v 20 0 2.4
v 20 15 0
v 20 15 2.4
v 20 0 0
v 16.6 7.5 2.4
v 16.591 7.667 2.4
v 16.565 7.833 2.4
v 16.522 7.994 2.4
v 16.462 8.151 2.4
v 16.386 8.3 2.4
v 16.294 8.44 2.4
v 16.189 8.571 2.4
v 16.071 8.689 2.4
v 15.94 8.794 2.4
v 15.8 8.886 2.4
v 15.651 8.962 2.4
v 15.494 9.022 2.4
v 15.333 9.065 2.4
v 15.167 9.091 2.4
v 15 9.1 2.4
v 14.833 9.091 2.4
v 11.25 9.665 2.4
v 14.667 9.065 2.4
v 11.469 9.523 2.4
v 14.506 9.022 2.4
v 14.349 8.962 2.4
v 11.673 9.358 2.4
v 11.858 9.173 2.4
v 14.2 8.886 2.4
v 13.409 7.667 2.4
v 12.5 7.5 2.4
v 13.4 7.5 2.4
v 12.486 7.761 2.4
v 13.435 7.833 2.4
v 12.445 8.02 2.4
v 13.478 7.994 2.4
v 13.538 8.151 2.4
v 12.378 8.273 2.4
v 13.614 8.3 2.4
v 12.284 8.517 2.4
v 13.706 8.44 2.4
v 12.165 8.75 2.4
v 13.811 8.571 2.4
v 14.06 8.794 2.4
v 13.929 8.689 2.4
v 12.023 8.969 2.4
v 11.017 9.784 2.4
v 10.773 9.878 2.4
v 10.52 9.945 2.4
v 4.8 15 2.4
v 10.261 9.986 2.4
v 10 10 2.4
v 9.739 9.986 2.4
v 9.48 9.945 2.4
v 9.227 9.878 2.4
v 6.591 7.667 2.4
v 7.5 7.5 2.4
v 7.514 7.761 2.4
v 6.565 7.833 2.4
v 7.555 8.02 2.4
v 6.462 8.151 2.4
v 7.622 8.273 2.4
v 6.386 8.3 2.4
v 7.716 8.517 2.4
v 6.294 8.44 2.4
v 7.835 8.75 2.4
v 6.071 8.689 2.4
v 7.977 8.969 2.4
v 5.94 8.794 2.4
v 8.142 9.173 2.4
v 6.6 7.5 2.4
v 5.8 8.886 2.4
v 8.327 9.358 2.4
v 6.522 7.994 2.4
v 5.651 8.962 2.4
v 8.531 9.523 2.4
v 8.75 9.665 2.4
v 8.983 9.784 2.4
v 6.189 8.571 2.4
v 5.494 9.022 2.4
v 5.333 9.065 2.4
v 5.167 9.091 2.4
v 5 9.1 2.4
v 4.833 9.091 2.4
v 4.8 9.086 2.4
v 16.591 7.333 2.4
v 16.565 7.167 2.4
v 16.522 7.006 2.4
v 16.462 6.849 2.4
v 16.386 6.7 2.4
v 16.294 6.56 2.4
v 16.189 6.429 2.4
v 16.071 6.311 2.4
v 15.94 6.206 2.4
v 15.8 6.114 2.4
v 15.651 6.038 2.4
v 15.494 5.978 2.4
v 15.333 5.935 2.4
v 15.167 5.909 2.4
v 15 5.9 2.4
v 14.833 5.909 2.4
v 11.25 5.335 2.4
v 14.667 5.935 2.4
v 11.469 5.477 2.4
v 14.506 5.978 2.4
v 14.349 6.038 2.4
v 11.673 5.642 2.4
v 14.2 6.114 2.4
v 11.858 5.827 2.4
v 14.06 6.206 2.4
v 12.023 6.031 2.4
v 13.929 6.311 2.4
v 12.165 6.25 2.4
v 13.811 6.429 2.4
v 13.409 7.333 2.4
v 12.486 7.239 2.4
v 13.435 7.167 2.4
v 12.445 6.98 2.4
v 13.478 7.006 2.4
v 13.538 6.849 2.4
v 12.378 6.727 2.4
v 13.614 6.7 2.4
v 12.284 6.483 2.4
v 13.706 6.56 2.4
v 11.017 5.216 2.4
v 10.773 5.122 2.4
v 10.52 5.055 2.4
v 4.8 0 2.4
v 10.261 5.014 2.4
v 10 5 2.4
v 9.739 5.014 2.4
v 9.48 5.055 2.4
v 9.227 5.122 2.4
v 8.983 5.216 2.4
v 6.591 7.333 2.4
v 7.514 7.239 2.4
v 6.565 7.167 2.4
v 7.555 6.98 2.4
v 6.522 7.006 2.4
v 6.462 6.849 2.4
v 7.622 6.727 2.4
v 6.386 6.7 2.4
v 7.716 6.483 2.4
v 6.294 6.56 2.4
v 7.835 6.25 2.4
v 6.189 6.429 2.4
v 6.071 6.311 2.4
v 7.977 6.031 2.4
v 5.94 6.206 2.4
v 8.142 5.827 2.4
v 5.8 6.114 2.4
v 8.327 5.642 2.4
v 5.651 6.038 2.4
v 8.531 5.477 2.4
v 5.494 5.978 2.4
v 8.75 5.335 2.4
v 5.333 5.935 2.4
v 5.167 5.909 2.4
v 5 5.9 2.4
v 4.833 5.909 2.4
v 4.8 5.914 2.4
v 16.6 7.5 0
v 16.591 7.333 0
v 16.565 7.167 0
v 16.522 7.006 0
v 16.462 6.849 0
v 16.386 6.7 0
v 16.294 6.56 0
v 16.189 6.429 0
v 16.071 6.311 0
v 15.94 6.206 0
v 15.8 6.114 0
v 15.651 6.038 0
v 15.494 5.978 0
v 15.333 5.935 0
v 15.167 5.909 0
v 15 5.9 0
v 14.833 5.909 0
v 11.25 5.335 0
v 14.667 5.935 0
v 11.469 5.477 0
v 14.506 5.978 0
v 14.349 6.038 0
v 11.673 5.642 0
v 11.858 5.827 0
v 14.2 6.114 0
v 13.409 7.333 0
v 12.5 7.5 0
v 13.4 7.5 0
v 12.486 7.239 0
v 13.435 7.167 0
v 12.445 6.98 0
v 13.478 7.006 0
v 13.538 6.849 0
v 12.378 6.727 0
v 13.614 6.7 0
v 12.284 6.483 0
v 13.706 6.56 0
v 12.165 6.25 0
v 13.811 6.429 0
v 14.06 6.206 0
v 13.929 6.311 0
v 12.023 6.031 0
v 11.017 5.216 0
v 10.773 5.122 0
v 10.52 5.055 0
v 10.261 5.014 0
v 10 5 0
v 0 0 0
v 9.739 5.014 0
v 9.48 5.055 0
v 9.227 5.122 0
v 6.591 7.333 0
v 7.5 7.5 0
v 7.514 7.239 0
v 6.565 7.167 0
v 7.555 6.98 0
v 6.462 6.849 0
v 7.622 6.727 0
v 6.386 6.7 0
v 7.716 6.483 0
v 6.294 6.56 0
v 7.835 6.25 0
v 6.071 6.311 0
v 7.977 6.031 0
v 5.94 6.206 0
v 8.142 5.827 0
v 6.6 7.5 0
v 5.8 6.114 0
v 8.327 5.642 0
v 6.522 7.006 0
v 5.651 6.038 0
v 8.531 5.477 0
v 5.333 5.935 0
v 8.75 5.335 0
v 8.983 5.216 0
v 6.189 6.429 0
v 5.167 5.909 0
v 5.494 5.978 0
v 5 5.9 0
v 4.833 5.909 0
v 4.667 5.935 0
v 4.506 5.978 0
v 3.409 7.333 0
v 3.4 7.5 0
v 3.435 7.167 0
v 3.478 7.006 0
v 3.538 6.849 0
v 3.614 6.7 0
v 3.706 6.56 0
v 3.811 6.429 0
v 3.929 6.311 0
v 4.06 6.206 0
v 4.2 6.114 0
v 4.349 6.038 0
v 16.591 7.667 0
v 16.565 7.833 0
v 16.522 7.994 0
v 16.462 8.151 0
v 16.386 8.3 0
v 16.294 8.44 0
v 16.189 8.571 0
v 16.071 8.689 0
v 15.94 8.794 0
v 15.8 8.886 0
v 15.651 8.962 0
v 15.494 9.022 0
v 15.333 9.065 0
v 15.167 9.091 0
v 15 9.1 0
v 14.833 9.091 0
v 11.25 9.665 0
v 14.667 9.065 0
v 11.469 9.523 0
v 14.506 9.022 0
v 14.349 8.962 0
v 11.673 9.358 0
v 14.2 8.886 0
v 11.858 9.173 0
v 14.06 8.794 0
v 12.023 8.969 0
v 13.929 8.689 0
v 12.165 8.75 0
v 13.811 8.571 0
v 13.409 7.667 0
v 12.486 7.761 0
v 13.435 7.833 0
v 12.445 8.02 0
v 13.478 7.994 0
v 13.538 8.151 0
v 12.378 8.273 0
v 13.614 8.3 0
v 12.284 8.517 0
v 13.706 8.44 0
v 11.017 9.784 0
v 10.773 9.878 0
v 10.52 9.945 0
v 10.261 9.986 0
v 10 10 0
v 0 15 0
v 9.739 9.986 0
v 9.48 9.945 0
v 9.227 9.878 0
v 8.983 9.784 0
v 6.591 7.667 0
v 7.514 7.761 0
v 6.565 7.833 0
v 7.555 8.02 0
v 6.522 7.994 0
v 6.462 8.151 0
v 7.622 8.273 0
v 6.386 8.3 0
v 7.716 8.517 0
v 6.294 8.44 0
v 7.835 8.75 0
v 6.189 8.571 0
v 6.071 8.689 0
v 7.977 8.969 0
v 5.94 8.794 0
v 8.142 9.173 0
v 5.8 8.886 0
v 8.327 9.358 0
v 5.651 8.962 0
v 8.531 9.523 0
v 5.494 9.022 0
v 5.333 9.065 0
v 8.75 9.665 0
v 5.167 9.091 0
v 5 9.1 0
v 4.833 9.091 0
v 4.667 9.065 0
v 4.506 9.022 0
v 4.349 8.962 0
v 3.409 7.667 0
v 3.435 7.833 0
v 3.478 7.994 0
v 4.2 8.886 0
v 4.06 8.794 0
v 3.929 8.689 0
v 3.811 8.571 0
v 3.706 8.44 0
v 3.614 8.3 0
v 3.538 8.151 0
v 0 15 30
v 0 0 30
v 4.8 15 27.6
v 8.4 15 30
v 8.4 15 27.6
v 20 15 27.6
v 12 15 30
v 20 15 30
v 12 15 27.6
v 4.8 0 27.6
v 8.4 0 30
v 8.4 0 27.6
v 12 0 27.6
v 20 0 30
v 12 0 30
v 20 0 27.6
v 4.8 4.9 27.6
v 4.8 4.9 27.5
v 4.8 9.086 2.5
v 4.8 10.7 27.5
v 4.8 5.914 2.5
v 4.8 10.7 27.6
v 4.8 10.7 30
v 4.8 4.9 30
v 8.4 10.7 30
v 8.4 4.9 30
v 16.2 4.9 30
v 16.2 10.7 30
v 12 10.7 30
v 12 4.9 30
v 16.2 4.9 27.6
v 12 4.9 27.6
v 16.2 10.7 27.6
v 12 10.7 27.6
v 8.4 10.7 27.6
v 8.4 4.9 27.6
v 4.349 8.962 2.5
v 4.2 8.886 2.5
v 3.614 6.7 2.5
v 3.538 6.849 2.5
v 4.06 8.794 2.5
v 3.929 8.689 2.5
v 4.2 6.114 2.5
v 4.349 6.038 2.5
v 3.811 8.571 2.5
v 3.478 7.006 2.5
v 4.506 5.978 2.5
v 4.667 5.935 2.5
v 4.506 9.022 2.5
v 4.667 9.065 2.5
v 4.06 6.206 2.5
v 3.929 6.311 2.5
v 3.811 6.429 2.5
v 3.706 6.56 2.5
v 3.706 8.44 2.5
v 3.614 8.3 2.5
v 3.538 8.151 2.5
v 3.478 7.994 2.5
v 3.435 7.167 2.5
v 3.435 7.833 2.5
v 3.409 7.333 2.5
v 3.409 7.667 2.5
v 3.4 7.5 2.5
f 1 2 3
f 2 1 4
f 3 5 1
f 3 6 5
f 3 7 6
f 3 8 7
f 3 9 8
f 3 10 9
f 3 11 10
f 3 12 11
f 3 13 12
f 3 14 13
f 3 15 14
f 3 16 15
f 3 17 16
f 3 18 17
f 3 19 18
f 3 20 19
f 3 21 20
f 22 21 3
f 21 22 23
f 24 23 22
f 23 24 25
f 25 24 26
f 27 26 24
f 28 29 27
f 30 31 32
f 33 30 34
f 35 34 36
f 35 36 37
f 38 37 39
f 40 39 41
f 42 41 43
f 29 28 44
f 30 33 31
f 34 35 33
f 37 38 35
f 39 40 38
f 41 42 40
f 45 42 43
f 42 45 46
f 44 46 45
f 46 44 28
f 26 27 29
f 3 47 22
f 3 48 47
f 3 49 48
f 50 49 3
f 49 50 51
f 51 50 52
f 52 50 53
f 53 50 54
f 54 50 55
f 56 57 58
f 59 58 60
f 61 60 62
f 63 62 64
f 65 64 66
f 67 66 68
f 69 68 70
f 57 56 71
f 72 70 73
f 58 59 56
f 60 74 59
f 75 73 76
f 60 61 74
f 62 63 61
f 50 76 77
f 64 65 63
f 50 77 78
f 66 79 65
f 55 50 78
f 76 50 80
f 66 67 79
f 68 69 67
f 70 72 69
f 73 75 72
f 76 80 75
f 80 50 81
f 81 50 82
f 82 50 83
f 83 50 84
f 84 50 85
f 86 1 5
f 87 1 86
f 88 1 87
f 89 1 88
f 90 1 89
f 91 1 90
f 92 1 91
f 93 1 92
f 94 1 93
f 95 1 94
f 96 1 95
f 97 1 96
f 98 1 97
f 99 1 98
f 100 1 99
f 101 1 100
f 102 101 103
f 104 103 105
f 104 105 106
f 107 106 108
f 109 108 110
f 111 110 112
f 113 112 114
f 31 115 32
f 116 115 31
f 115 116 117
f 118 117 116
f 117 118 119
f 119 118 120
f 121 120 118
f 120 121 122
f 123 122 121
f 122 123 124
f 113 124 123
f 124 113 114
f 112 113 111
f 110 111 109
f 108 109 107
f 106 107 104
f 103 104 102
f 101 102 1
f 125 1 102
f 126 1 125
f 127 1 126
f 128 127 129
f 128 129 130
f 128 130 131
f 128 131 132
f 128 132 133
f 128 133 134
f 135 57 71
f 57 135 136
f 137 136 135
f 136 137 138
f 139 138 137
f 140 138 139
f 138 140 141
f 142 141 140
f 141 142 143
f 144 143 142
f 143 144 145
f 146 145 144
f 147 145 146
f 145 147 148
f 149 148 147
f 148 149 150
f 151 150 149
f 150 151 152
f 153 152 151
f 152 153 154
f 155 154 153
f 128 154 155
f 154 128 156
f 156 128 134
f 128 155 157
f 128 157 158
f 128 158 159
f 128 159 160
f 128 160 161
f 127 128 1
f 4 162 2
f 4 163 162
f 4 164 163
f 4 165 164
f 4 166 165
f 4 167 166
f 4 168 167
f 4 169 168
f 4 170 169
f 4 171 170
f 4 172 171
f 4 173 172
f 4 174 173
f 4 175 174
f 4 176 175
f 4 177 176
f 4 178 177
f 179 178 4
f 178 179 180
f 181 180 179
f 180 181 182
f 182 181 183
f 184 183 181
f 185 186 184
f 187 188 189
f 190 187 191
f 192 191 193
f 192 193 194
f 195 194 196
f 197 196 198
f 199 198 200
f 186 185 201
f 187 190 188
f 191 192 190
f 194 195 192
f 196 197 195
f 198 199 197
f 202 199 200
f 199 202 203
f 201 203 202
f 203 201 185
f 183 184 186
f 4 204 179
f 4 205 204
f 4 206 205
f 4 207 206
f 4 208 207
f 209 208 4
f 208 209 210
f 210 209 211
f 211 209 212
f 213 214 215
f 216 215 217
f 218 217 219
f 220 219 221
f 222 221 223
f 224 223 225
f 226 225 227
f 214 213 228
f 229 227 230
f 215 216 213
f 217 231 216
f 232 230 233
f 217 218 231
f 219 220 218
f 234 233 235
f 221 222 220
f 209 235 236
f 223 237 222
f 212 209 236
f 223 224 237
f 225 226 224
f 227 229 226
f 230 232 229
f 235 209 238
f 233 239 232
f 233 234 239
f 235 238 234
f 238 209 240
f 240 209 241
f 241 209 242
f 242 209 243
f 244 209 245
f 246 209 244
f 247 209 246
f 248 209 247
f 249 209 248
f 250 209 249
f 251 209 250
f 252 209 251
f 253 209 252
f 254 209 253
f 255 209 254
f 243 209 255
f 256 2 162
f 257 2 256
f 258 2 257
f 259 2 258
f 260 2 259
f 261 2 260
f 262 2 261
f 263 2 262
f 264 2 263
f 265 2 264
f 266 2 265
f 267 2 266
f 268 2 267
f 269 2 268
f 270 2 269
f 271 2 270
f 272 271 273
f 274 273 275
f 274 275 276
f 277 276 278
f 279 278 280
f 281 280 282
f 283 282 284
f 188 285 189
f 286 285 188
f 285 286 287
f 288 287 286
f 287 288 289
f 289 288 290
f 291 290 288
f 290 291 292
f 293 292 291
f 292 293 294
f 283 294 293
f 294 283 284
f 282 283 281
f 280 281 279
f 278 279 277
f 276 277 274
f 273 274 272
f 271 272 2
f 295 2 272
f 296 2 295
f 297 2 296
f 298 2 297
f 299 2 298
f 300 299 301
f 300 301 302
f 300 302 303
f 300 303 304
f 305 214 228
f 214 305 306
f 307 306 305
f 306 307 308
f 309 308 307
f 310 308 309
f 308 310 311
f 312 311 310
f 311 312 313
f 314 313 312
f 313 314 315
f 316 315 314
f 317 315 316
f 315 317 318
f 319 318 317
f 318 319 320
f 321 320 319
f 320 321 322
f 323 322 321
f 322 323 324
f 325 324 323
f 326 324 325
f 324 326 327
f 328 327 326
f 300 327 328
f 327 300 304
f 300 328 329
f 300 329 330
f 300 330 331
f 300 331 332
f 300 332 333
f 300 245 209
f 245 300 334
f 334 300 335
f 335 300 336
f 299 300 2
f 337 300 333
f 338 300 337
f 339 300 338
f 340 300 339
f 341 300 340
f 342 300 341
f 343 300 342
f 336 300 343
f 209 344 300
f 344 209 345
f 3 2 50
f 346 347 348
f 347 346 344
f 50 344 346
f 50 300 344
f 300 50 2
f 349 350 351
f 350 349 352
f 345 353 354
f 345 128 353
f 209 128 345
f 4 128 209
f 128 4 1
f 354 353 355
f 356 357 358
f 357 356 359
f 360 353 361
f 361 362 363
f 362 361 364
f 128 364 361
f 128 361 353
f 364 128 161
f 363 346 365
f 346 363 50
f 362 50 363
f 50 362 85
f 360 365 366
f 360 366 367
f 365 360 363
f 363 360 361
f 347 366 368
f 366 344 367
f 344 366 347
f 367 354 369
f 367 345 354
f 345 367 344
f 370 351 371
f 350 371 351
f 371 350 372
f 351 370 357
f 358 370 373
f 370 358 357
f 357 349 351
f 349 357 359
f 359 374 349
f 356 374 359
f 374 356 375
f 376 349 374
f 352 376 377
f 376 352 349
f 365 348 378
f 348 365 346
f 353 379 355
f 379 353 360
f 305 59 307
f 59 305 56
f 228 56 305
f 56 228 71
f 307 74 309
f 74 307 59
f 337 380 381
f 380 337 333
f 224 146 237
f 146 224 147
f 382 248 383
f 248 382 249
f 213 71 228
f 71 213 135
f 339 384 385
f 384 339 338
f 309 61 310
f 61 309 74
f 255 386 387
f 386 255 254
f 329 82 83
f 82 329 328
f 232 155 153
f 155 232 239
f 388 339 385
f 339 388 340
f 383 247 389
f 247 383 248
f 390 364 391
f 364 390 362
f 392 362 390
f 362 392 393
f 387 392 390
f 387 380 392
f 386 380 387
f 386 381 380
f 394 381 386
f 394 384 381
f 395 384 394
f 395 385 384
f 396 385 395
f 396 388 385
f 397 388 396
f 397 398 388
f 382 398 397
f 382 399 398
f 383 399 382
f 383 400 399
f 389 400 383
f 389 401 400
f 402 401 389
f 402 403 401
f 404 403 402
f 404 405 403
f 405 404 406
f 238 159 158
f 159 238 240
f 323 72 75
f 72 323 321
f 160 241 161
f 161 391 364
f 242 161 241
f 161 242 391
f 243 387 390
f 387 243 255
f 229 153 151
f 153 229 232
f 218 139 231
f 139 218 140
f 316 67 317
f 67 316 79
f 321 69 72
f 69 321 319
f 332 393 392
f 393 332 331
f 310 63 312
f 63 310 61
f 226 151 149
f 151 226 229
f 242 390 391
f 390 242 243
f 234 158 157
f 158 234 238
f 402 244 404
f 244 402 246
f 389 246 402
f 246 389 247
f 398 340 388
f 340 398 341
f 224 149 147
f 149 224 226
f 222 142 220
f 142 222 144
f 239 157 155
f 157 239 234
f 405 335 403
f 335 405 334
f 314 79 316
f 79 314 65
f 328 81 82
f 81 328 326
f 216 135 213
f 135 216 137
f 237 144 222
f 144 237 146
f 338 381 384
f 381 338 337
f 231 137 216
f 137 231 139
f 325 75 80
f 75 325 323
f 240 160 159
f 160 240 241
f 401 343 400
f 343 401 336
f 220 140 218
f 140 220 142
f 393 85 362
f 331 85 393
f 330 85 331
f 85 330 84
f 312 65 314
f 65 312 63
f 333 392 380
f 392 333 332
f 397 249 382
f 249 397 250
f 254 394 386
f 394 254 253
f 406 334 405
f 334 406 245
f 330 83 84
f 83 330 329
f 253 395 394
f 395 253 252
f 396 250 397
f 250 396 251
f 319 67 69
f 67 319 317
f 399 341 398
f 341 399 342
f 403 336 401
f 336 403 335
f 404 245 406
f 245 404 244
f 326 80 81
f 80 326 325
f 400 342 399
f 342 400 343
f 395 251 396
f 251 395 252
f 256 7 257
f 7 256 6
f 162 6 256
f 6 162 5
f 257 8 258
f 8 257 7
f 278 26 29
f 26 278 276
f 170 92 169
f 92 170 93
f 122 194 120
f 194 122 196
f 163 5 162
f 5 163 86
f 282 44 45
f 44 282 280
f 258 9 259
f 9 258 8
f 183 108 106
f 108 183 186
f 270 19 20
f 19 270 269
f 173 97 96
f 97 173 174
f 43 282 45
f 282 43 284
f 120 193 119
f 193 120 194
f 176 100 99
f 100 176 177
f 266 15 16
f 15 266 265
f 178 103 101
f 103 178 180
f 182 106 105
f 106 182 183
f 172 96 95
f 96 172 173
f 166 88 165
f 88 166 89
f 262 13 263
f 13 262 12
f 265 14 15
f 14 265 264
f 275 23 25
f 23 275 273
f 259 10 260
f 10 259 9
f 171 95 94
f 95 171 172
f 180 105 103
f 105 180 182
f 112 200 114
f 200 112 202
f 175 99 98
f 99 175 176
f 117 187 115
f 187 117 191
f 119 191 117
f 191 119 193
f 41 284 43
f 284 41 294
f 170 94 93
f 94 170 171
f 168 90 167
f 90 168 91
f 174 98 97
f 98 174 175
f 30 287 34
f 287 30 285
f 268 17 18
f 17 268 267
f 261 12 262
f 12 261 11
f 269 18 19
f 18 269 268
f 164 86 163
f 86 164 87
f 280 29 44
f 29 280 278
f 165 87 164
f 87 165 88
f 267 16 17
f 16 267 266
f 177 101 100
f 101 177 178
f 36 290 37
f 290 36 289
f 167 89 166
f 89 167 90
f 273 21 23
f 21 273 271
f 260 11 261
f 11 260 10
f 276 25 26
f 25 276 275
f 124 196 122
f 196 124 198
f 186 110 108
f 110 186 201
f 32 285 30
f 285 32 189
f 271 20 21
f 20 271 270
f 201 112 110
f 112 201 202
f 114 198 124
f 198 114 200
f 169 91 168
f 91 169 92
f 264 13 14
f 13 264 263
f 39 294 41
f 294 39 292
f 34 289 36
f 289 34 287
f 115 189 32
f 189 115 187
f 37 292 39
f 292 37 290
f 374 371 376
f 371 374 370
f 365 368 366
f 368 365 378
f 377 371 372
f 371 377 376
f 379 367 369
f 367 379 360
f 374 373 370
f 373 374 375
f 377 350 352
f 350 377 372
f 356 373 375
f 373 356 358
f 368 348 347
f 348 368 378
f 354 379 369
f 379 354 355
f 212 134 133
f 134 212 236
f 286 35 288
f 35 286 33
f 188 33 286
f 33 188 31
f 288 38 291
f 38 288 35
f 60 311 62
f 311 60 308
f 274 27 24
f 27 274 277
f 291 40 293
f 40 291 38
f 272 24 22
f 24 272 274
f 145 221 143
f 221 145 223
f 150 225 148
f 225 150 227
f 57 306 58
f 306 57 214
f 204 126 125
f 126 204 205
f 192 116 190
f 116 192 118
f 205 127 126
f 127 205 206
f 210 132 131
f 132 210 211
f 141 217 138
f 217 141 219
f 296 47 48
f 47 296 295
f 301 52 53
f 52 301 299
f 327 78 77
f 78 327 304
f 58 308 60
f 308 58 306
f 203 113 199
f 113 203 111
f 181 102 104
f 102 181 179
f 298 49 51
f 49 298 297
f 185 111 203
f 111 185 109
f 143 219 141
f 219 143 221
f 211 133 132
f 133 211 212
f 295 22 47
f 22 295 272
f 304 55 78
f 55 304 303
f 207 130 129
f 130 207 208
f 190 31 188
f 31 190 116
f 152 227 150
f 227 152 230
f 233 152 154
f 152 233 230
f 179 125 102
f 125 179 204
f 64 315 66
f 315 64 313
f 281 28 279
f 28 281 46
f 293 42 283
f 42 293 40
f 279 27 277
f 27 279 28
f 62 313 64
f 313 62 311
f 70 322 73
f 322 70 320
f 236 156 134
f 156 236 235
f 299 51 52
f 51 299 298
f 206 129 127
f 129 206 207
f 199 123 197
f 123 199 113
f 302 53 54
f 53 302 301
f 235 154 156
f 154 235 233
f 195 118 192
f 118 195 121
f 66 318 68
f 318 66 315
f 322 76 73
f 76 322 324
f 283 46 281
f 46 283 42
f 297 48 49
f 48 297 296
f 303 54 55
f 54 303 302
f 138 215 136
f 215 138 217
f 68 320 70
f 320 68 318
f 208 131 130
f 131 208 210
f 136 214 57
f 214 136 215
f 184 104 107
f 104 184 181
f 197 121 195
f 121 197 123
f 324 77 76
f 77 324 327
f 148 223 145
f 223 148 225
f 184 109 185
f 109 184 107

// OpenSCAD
// file: parameters.scad
// =============================================================================
// Coil Winder - Common Parameters
// DTU 34621 Metal Detector Project
// =============================================================================

// -----------------------------------------------------------------------------
// Hardware Dimensions
// -----------------------------------------------------------------------------

// M8 Threaded Rod (Spindle)
spindle_dia = 8;
spindle_length = 300;

// 608ZZ Bearing (Skateboard bearing)
bearing_od = 22;
bearing_id = 8;
bearing_width = 7;

// M3 Hardware
m3_bolt_dia = 3.2;
m3_nut_dia = 6.4;
m3_nut_height = 2.4;
m3_head_dia = 5.5;
m3_head_height = 3;

// M8 Hardware
m8_nut_dia = 14.6;
m8_nut_height = 6.5;

// -----------------------------------------------------------------------------
// Servo Dimensions (SG90 / MG90S style)
// -----------------------------------------------------------------------------

servo_body_w = 23;
servo_body_h = 22.5;
servo_body_d = 12.5;
servo_tab_w = 32.5;
servo_tab_h = 2.5;
servo_tab_offset = 15.5;  // from bottom
servo_mount_hole_spacing = 28;
servo_shaft_offset = 5.5;  // from center of body
servo_horn_length = 15;

// -----------------------------------------------------------------------------
// ITR8307 Optical Sensor
// -----------------------------------------------------------------------------

itr8307_width = 10.8;
itr8307_depth = 5.2;
itr8307_height = 6.3;
itr8307_slot_width = 3;
itr8307_slot_depth = 4;

// -----------------------------------------------------------------------------
// Coil Dimensions
// -----------------------------------------------------------------------------

// TX Coil - 200mm diameter
tx_coil_dia = 200;
tx_coil_width = 18;
tx_coil_turns = 68;

// RX Coil - 80mm diameter
rx_coil_dia = 80;
rx_coil_width = 14;
rx_coil_turns = 170;

// Bucking Coil - 120mm diameter
buck_coil_dia = 120;
buck_coil_width = 18;
buck_coil_turns = 35;

// -----------------------------------------------------------------------------
// Frame Dimensions
// -----------------------------------------------------------------------------

base_length = 250;
base_width = 120;
base_thickness = 5;

bearing_mount_height = 40;
bearing_mount_width = 35;
bearing_mount_depth = 25;

// Distance between bearing centers
spindle_span = 200;

// -----------------------------------------------------------------------------
// Wire Guide / Traverse
// -----------------------------------------------------------------------------

guide_rail_length = 80;
guide_rail_width = 10;
guide_rail_height = 5;

carriage_width = 25;
carriage_depth = 20;
carriage_height = 15;

// -----------------------------------------------------------------------------
// Encoder Wheel
// -----------------------------------------------------------------------------

encoder_wheel_dia = 40;
encoder_wheel_thickness = 5;
encoder_slot_width = 5;
encoder_slot_depth = 12;

// -----------------------------------------------------------------------------
// General Tolerances
// -----------------------------------------------------------------------------

clearance = 0.3;        // General clearance for fitting parts
press_fit = 0.1;        // Tight fit
slide_fit = 0.4;        // Sliding fit

// -----------------------------------------------------------------------------
// Print Settings
// -----------------------------------------------------------------------------

wall_thickness = 2.4;   // 3 perimeters at 0.4mm nozzle
layer_height = 0.2;

$fn = 60;  // Circle resolution
// main file
// =============================================================================
// ITR8307 Sensor Mount - Positions optical sensor for encoder wheel
// =============================================================================

include <parameters.scad>

mount_width = 20;
mount_depth = 15;
mount_height = 30;  // Height to align with encoder wheel

module sensor_mount() {
    difference() {
        union() {
            // Base
            cube([mount_width, mount_depth, wall_thickness]);

            // Vertical arm
            cube([wall_thickness * 2, mount_depth, mount_height]);

            // Sensor holder platform
            translate([0, 0, mount_height - wall_thickness])
                cube([mount_width, mount_depth, wall_thickness]);
        }

        // ITR8307 pocket
        translate([wall_thickness * 2, (mount_depth - itr8307_depth)/2, mount_height - wall_thickness - 0.1]) {
            // Sensor body
            cube([itr8307_width + clearance*2, itr8307_depth + clearance*2, wall_thickness + 0.2]);
        }

        // Slot for encoder wheel to pass through
        translate([wall_thickness * 2 + itr8307_width/2 - itr8307_slot_width/2 - clearance,
                   -0.1,
                   mount_height - wall_thickness - encoder_wheel_thickness - 5])
            cube([itr8307_slot_width + clearance*2, mount_depth + 0.2, encoder_wheel_thickness + 10]);

        // Wire routing hole
        translate([mount_width/2, mount_depth/2, -0.1])
            cylinder(d=5, h=wall_thickness + 0.2);

        // Mounting holes (M3)
        for (x = [5, mount_width - 5]) {
            translate([x, mount_depth/2, -0.1])
                cylinder(d=m3_bolt_dia, h=wall_thickness + 0.2);
        }
    }
}

// ITR8307 visualization (for reference)
module itr8307_visual() {
    color("darkgray")
    translate([wall_thickness * 2, (mount_depth - itr8307_depth)/2, mount_height - wall_thickness])
        cube([itr8307_width, itr8307_depth, itr8307_height]);
}

// Render for export
sensor_mount();

// Show sensor (comment out for export)
// itr8307_visual();
